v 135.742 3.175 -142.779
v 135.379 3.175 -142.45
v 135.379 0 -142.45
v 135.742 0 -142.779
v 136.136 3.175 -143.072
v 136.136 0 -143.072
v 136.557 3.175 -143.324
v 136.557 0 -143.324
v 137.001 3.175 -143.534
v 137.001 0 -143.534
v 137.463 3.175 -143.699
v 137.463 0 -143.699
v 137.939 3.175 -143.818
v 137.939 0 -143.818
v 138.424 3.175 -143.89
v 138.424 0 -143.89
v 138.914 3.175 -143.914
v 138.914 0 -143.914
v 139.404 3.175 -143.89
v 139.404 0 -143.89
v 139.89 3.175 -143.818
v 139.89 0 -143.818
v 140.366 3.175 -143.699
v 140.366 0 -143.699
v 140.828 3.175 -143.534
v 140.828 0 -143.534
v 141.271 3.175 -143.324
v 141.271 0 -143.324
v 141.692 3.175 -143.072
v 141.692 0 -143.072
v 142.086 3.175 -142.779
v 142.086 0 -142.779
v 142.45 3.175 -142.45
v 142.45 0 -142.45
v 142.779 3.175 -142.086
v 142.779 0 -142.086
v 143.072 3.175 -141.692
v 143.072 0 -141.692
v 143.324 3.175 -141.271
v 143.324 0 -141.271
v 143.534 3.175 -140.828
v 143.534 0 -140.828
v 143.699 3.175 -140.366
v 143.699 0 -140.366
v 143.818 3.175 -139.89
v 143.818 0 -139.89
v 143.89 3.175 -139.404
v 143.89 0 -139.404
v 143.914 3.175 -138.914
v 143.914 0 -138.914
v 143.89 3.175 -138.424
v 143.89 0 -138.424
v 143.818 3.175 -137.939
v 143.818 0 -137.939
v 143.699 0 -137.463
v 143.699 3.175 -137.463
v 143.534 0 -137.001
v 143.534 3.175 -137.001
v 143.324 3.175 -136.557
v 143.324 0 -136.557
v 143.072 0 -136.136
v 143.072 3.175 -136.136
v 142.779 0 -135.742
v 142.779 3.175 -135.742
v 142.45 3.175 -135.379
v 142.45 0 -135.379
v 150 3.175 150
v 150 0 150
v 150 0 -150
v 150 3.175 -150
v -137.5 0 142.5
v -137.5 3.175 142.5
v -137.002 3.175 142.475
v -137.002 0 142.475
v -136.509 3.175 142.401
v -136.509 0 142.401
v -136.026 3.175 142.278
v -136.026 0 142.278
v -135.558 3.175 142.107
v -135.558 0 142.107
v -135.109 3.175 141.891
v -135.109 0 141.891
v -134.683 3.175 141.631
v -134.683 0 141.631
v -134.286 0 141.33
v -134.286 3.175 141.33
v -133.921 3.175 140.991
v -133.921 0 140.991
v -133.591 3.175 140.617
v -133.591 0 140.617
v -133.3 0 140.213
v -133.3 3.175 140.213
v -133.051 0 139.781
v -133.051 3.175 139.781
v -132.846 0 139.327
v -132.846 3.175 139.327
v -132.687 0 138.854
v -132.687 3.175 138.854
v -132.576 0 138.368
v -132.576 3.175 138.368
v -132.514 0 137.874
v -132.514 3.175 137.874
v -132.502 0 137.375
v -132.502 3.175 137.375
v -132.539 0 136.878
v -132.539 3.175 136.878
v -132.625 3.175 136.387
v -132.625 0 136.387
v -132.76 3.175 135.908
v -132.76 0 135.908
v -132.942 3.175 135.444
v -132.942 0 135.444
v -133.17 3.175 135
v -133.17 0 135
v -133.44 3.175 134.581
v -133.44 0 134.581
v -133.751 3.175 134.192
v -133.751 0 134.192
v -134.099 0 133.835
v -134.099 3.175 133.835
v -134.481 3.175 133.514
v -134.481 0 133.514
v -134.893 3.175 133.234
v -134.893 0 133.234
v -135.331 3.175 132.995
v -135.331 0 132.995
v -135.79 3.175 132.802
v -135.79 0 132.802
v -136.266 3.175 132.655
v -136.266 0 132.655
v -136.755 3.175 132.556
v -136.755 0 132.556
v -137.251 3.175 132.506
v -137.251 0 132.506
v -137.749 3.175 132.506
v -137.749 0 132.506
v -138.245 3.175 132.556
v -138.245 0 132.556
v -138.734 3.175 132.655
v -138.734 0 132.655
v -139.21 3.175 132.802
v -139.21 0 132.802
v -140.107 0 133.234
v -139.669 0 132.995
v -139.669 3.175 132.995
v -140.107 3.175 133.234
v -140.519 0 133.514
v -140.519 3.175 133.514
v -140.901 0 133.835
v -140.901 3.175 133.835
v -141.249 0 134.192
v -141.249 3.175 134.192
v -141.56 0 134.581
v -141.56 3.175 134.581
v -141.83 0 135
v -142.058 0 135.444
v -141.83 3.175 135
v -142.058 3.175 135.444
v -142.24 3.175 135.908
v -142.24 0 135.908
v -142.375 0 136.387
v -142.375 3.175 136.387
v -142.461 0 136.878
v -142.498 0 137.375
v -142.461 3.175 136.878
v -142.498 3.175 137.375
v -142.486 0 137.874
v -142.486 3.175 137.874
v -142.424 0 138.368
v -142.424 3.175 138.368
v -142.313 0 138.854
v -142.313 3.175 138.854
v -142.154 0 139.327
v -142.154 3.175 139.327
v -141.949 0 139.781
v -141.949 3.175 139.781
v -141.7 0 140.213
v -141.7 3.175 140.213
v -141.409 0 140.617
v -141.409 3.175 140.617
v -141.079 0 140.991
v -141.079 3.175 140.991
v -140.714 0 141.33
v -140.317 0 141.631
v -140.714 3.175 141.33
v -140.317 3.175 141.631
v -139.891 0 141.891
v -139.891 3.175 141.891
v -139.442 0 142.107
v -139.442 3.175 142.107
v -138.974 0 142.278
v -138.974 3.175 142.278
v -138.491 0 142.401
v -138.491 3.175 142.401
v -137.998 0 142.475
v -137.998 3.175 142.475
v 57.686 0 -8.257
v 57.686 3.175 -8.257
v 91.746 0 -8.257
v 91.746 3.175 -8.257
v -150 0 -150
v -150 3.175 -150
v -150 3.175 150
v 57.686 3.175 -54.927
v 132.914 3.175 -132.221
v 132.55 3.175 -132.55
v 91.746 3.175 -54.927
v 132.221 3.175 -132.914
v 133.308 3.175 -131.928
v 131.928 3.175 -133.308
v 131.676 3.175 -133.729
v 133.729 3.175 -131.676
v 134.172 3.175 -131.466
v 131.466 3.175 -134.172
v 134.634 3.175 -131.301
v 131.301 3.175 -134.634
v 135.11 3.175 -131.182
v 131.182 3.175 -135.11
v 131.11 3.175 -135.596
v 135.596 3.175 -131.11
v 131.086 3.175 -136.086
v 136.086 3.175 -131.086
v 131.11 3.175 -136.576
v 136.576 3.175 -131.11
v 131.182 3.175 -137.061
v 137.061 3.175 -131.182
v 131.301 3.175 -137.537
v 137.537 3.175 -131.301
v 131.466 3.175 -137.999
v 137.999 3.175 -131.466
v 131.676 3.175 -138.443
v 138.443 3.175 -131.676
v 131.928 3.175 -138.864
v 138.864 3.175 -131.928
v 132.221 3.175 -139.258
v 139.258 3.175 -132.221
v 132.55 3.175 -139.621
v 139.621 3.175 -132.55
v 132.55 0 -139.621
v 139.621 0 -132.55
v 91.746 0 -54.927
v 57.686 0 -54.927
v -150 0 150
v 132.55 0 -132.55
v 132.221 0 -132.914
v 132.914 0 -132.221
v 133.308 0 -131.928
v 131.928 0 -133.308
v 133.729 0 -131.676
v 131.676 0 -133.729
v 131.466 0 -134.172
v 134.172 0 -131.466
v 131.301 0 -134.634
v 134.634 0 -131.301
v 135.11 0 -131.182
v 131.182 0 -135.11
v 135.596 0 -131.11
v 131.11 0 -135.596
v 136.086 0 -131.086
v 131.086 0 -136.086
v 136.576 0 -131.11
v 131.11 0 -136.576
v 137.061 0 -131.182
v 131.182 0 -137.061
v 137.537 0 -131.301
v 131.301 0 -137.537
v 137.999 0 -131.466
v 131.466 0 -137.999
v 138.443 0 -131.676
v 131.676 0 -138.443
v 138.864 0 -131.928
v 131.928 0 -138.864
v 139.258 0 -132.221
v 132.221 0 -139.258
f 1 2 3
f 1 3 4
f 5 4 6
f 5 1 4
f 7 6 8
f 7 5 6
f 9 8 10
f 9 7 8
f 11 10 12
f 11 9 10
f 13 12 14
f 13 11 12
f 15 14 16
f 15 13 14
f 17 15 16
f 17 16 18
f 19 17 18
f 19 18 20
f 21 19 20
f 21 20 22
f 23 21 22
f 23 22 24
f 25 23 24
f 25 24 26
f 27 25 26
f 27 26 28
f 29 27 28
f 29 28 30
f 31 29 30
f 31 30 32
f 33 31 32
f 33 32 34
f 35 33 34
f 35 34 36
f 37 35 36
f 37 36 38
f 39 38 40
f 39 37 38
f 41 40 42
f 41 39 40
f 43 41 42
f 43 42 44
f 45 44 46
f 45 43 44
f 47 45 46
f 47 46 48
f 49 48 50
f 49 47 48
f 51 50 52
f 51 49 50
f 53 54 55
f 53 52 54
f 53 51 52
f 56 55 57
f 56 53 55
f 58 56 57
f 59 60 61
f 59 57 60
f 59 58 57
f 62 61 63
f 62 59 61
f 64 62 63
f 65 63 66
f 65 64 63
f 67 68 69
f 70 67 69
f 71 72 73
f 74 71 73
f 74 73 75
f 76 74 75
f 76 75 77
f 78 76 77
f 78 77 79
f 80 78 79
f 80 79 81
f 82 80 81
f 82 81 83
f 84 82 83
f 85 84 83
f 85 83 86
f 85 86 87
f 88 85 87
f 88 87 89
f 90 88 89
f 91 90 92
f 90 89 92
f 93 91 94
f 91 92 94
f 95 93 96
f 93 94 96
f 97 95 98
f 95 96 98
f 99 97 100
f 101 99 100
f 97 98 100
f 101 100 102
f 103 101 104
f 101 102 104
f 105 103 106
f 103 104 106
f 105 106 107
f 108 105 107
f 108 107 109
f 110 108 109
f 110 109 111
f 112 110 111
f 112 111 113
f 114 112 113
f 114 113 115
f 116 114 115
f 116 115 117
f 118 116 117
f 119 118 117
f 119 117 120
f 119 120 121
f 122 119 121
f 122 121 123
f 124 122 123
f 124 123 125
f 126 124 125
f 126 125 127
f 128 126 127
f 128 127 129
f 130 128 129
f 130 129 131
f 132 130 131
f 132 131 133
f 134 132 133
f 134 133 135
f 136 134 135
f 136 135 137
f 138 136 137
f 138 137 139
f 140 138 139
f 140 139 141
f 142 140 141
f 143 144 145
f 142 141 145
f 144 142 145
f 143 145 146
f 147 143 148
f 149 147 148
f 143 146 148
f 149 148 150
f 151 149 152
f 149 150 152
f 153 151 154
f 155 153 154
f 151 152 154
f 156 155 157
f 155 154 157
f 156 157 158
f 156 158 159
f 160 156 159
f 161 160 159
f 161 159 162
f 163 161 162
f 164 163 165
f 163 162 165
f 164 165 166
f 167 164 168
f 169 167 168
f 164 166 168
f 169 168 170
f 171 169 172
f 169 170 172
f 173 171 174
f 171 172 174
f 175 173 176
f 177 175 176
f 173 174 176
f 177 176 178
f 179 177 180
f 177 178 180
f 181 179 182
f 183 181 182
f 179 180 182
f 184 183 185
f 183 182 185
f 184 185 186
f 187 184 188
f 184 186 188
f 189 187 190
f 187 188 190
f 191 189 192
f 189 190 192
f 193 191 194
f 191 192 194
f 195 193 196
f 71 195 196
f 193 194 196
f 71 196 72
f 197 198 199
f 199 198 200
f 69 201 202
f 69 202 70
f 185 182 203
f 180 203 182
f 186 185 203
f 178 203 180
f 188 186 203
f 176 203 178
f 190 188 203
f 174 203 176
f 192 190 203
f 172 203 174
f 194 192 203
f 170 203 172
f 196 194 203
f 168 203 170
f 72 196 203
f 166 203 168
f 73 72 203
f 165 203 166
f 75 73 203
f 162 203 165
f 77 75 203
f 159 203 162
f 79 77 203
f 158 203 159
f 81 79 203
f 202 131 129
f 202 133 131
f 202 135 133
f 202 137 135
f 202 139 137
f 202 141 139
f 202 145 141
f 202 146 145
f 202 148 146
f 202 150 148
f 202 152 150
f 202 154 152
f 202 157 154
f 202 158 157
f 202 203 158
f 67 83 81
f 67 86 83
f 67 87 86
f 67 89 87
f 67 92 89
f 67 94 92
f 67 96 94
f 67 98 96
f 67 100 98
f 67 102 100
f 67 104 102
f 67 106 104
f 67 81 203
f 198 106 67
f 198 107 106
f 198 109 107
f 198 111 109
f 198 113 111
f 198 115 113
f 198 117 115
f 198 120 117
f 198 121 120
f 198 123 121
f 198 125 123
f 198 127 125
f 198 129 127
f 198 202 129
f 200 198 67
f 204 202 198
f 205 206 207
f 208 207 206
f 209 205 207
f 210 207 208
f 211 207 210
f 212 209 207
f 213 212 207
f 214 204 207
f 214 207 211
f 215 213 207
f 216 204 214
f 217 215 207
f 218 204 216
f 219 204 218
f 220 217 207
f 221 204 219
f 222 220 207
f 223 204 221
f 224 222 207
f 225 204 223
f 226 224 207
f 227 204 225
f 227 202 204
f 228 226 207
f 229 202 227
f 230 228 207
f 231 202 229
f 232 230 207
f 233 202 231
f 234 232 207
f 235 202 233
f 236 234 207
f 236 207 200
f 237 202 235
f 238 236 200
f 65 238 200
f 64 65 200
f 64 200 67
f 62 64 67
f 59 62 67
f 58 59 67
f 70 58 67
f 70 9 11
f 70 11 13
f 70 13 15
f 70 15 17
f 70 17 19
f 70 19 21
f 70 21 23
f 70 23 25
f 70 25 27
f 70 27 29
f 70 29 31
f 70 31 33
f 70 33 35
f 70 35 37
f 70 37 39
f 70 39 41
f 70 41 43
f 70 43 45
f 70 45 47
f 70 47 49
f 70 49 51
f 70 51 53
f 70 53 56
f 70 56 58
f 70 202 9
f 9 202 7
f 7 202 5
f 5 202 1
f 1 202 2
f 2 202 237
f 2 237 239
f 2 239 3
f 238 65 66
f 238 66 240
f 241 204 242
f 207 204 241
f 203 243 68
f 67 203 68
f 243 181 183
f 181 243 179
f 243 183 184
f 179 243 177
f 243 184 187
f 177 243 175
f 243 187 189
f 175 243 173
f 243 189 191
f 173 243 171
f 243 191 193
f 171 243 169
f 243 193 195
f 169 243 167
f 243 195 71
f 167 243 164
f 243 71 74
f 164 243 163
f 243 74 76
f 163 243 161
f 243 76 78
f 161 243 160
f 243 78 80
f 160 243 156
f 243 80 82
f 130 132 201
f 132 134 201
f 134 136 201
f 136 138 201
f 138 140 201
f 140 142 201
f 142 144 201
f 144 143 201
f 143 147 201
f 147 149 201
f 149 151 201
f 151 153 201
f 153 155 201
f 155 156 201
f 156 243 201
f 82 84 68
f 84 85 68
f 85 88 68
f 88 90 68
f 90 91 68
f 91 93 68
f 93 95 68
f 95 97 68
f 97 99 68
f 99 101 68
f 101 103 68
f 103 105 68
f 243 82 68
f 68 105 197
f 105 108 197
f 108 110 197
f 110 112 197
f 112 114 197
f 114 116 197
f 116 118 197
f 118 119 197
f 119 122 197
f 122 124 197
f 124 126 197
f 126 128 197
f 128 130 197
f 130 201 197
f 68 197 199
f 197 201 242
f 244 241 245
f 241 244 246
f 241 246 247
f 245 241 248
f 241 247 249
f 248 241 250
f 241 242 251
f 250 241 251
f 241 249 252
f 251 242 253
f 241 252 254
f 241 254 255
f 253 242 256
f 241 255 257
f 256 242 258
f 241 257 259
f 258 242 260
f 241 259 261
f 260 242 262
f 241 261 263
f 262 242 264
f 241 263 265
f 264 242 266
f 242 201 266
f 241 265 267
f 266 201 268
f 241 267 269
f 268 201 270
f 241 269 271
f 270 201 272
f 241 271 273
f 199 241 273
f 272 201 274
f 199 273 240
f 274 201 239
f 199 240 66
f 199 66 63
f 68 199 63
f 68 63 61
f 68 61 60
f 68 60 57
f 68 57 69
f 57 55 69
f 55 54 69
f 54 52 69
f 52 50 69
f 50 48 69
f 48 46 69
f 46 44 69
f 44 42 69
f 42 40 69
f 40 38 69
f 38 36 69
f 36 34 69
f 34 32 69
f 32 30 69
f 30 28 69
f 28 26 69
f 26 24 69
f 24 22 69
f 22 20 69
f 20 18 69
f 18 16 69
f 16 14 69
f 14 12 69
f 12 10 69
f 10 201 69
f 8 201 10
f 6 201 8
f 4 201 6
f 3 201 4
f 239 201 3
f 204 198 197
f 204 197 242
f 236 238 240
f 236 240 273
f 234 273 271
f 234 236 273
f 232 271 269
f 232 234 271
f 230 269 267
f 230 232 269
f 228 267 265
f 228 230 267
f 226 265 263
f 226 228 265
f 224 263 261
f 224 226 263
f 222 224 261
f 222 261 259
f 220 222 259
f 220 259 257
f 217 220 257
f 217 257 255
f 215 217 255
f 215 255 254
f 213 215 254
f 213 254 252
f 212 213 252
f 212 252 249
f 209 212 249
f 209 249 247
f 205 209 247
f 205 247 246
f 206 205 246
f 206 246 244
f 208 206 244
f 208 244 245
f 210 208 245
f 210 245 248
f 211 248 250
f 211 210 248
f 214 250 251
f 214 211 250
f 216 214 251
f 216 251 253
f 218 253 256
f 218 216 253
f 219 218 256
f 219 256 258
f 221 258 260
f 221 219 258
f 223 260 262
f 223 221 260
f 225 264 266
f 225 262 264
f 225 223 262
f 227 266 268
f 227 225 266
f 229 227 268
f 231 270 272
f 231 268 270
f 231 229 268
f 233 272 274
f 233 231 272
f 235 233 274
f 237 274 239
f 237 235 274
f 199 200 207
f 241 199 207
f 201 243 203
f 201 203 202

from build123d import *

# Parameters (mm, degrees)
SKETCH1_W           = 300
SKETCH1_H           = 300
BOSS_EXTRUDE1_DEPTH = 3.175
SKETCH2_R           = 5
CUT_EXTRUDE1_DEPTH  = 213.155793286
SKETCH3_W           = 34.06
SKETCH3_H           = 46.67
CUT_EXTRUDE2_DEPTH  = 213.155793286


with BuildPart() as part:
    # Sketch1 → Boss-Extrude1 (new body)
    with BuildSketch(Plane(origin=(0, 0, 0), x_dir=(1, 0, 0), z_dir=(0, 1, 0))):
        Rectangle(SKETCH1_W, SKETCH1_H)
    extrude(amount=BOSS_EXTRUDE1_DEPTH)

    # Sketch2 → Cut-Extrude1 (cut, through all)
    with BuildSketch(Plane(origin=(0, 3.175, 0), x_dir=(1, 0, 0), z_dir=(0, 1, 0))):
        with Locations(Location((-137.5, -137.5, 0), (0, 0, 270))):
            Circle(SKETCH2_R)
        with BuildLine():
            Line((142.449747468, 135.378679656), (139.621320344, 132.550252532))
            ThreePointArc((139.621320344, 132.550252532), (132.550252532, 132.550252532), (132.550252532, 139.621320344))
            Line((132.550252532, 139.621320344), (135.378679656, 142.449747468))
            ThreePointArc((135.378679656, 142.449747468), (142.449747468, 142.449747468), (142.449747468, 135.378679656))
        make_face()
    extrude(amount=-CUT_EXTRUDE1_DEPTH, mode=Mode.SUBTRACT)

    # Sketch3 → Cut-Extrude2 (cut, through all)
    with BuildSketch(Plane(origin=(0, 3.175, 0), x_dir=(1, 0, 0), z_dir=(0, 1, 0))):
        with Locations((74.716012632, 31.592141137)):
            Rectangle(SKETCH3_W, SKETCH3_H)
    extrude(amount=-CUT_EXTRUDE2_DEPTH, mode=Mode.SUBTRACT)


solid = part.part
